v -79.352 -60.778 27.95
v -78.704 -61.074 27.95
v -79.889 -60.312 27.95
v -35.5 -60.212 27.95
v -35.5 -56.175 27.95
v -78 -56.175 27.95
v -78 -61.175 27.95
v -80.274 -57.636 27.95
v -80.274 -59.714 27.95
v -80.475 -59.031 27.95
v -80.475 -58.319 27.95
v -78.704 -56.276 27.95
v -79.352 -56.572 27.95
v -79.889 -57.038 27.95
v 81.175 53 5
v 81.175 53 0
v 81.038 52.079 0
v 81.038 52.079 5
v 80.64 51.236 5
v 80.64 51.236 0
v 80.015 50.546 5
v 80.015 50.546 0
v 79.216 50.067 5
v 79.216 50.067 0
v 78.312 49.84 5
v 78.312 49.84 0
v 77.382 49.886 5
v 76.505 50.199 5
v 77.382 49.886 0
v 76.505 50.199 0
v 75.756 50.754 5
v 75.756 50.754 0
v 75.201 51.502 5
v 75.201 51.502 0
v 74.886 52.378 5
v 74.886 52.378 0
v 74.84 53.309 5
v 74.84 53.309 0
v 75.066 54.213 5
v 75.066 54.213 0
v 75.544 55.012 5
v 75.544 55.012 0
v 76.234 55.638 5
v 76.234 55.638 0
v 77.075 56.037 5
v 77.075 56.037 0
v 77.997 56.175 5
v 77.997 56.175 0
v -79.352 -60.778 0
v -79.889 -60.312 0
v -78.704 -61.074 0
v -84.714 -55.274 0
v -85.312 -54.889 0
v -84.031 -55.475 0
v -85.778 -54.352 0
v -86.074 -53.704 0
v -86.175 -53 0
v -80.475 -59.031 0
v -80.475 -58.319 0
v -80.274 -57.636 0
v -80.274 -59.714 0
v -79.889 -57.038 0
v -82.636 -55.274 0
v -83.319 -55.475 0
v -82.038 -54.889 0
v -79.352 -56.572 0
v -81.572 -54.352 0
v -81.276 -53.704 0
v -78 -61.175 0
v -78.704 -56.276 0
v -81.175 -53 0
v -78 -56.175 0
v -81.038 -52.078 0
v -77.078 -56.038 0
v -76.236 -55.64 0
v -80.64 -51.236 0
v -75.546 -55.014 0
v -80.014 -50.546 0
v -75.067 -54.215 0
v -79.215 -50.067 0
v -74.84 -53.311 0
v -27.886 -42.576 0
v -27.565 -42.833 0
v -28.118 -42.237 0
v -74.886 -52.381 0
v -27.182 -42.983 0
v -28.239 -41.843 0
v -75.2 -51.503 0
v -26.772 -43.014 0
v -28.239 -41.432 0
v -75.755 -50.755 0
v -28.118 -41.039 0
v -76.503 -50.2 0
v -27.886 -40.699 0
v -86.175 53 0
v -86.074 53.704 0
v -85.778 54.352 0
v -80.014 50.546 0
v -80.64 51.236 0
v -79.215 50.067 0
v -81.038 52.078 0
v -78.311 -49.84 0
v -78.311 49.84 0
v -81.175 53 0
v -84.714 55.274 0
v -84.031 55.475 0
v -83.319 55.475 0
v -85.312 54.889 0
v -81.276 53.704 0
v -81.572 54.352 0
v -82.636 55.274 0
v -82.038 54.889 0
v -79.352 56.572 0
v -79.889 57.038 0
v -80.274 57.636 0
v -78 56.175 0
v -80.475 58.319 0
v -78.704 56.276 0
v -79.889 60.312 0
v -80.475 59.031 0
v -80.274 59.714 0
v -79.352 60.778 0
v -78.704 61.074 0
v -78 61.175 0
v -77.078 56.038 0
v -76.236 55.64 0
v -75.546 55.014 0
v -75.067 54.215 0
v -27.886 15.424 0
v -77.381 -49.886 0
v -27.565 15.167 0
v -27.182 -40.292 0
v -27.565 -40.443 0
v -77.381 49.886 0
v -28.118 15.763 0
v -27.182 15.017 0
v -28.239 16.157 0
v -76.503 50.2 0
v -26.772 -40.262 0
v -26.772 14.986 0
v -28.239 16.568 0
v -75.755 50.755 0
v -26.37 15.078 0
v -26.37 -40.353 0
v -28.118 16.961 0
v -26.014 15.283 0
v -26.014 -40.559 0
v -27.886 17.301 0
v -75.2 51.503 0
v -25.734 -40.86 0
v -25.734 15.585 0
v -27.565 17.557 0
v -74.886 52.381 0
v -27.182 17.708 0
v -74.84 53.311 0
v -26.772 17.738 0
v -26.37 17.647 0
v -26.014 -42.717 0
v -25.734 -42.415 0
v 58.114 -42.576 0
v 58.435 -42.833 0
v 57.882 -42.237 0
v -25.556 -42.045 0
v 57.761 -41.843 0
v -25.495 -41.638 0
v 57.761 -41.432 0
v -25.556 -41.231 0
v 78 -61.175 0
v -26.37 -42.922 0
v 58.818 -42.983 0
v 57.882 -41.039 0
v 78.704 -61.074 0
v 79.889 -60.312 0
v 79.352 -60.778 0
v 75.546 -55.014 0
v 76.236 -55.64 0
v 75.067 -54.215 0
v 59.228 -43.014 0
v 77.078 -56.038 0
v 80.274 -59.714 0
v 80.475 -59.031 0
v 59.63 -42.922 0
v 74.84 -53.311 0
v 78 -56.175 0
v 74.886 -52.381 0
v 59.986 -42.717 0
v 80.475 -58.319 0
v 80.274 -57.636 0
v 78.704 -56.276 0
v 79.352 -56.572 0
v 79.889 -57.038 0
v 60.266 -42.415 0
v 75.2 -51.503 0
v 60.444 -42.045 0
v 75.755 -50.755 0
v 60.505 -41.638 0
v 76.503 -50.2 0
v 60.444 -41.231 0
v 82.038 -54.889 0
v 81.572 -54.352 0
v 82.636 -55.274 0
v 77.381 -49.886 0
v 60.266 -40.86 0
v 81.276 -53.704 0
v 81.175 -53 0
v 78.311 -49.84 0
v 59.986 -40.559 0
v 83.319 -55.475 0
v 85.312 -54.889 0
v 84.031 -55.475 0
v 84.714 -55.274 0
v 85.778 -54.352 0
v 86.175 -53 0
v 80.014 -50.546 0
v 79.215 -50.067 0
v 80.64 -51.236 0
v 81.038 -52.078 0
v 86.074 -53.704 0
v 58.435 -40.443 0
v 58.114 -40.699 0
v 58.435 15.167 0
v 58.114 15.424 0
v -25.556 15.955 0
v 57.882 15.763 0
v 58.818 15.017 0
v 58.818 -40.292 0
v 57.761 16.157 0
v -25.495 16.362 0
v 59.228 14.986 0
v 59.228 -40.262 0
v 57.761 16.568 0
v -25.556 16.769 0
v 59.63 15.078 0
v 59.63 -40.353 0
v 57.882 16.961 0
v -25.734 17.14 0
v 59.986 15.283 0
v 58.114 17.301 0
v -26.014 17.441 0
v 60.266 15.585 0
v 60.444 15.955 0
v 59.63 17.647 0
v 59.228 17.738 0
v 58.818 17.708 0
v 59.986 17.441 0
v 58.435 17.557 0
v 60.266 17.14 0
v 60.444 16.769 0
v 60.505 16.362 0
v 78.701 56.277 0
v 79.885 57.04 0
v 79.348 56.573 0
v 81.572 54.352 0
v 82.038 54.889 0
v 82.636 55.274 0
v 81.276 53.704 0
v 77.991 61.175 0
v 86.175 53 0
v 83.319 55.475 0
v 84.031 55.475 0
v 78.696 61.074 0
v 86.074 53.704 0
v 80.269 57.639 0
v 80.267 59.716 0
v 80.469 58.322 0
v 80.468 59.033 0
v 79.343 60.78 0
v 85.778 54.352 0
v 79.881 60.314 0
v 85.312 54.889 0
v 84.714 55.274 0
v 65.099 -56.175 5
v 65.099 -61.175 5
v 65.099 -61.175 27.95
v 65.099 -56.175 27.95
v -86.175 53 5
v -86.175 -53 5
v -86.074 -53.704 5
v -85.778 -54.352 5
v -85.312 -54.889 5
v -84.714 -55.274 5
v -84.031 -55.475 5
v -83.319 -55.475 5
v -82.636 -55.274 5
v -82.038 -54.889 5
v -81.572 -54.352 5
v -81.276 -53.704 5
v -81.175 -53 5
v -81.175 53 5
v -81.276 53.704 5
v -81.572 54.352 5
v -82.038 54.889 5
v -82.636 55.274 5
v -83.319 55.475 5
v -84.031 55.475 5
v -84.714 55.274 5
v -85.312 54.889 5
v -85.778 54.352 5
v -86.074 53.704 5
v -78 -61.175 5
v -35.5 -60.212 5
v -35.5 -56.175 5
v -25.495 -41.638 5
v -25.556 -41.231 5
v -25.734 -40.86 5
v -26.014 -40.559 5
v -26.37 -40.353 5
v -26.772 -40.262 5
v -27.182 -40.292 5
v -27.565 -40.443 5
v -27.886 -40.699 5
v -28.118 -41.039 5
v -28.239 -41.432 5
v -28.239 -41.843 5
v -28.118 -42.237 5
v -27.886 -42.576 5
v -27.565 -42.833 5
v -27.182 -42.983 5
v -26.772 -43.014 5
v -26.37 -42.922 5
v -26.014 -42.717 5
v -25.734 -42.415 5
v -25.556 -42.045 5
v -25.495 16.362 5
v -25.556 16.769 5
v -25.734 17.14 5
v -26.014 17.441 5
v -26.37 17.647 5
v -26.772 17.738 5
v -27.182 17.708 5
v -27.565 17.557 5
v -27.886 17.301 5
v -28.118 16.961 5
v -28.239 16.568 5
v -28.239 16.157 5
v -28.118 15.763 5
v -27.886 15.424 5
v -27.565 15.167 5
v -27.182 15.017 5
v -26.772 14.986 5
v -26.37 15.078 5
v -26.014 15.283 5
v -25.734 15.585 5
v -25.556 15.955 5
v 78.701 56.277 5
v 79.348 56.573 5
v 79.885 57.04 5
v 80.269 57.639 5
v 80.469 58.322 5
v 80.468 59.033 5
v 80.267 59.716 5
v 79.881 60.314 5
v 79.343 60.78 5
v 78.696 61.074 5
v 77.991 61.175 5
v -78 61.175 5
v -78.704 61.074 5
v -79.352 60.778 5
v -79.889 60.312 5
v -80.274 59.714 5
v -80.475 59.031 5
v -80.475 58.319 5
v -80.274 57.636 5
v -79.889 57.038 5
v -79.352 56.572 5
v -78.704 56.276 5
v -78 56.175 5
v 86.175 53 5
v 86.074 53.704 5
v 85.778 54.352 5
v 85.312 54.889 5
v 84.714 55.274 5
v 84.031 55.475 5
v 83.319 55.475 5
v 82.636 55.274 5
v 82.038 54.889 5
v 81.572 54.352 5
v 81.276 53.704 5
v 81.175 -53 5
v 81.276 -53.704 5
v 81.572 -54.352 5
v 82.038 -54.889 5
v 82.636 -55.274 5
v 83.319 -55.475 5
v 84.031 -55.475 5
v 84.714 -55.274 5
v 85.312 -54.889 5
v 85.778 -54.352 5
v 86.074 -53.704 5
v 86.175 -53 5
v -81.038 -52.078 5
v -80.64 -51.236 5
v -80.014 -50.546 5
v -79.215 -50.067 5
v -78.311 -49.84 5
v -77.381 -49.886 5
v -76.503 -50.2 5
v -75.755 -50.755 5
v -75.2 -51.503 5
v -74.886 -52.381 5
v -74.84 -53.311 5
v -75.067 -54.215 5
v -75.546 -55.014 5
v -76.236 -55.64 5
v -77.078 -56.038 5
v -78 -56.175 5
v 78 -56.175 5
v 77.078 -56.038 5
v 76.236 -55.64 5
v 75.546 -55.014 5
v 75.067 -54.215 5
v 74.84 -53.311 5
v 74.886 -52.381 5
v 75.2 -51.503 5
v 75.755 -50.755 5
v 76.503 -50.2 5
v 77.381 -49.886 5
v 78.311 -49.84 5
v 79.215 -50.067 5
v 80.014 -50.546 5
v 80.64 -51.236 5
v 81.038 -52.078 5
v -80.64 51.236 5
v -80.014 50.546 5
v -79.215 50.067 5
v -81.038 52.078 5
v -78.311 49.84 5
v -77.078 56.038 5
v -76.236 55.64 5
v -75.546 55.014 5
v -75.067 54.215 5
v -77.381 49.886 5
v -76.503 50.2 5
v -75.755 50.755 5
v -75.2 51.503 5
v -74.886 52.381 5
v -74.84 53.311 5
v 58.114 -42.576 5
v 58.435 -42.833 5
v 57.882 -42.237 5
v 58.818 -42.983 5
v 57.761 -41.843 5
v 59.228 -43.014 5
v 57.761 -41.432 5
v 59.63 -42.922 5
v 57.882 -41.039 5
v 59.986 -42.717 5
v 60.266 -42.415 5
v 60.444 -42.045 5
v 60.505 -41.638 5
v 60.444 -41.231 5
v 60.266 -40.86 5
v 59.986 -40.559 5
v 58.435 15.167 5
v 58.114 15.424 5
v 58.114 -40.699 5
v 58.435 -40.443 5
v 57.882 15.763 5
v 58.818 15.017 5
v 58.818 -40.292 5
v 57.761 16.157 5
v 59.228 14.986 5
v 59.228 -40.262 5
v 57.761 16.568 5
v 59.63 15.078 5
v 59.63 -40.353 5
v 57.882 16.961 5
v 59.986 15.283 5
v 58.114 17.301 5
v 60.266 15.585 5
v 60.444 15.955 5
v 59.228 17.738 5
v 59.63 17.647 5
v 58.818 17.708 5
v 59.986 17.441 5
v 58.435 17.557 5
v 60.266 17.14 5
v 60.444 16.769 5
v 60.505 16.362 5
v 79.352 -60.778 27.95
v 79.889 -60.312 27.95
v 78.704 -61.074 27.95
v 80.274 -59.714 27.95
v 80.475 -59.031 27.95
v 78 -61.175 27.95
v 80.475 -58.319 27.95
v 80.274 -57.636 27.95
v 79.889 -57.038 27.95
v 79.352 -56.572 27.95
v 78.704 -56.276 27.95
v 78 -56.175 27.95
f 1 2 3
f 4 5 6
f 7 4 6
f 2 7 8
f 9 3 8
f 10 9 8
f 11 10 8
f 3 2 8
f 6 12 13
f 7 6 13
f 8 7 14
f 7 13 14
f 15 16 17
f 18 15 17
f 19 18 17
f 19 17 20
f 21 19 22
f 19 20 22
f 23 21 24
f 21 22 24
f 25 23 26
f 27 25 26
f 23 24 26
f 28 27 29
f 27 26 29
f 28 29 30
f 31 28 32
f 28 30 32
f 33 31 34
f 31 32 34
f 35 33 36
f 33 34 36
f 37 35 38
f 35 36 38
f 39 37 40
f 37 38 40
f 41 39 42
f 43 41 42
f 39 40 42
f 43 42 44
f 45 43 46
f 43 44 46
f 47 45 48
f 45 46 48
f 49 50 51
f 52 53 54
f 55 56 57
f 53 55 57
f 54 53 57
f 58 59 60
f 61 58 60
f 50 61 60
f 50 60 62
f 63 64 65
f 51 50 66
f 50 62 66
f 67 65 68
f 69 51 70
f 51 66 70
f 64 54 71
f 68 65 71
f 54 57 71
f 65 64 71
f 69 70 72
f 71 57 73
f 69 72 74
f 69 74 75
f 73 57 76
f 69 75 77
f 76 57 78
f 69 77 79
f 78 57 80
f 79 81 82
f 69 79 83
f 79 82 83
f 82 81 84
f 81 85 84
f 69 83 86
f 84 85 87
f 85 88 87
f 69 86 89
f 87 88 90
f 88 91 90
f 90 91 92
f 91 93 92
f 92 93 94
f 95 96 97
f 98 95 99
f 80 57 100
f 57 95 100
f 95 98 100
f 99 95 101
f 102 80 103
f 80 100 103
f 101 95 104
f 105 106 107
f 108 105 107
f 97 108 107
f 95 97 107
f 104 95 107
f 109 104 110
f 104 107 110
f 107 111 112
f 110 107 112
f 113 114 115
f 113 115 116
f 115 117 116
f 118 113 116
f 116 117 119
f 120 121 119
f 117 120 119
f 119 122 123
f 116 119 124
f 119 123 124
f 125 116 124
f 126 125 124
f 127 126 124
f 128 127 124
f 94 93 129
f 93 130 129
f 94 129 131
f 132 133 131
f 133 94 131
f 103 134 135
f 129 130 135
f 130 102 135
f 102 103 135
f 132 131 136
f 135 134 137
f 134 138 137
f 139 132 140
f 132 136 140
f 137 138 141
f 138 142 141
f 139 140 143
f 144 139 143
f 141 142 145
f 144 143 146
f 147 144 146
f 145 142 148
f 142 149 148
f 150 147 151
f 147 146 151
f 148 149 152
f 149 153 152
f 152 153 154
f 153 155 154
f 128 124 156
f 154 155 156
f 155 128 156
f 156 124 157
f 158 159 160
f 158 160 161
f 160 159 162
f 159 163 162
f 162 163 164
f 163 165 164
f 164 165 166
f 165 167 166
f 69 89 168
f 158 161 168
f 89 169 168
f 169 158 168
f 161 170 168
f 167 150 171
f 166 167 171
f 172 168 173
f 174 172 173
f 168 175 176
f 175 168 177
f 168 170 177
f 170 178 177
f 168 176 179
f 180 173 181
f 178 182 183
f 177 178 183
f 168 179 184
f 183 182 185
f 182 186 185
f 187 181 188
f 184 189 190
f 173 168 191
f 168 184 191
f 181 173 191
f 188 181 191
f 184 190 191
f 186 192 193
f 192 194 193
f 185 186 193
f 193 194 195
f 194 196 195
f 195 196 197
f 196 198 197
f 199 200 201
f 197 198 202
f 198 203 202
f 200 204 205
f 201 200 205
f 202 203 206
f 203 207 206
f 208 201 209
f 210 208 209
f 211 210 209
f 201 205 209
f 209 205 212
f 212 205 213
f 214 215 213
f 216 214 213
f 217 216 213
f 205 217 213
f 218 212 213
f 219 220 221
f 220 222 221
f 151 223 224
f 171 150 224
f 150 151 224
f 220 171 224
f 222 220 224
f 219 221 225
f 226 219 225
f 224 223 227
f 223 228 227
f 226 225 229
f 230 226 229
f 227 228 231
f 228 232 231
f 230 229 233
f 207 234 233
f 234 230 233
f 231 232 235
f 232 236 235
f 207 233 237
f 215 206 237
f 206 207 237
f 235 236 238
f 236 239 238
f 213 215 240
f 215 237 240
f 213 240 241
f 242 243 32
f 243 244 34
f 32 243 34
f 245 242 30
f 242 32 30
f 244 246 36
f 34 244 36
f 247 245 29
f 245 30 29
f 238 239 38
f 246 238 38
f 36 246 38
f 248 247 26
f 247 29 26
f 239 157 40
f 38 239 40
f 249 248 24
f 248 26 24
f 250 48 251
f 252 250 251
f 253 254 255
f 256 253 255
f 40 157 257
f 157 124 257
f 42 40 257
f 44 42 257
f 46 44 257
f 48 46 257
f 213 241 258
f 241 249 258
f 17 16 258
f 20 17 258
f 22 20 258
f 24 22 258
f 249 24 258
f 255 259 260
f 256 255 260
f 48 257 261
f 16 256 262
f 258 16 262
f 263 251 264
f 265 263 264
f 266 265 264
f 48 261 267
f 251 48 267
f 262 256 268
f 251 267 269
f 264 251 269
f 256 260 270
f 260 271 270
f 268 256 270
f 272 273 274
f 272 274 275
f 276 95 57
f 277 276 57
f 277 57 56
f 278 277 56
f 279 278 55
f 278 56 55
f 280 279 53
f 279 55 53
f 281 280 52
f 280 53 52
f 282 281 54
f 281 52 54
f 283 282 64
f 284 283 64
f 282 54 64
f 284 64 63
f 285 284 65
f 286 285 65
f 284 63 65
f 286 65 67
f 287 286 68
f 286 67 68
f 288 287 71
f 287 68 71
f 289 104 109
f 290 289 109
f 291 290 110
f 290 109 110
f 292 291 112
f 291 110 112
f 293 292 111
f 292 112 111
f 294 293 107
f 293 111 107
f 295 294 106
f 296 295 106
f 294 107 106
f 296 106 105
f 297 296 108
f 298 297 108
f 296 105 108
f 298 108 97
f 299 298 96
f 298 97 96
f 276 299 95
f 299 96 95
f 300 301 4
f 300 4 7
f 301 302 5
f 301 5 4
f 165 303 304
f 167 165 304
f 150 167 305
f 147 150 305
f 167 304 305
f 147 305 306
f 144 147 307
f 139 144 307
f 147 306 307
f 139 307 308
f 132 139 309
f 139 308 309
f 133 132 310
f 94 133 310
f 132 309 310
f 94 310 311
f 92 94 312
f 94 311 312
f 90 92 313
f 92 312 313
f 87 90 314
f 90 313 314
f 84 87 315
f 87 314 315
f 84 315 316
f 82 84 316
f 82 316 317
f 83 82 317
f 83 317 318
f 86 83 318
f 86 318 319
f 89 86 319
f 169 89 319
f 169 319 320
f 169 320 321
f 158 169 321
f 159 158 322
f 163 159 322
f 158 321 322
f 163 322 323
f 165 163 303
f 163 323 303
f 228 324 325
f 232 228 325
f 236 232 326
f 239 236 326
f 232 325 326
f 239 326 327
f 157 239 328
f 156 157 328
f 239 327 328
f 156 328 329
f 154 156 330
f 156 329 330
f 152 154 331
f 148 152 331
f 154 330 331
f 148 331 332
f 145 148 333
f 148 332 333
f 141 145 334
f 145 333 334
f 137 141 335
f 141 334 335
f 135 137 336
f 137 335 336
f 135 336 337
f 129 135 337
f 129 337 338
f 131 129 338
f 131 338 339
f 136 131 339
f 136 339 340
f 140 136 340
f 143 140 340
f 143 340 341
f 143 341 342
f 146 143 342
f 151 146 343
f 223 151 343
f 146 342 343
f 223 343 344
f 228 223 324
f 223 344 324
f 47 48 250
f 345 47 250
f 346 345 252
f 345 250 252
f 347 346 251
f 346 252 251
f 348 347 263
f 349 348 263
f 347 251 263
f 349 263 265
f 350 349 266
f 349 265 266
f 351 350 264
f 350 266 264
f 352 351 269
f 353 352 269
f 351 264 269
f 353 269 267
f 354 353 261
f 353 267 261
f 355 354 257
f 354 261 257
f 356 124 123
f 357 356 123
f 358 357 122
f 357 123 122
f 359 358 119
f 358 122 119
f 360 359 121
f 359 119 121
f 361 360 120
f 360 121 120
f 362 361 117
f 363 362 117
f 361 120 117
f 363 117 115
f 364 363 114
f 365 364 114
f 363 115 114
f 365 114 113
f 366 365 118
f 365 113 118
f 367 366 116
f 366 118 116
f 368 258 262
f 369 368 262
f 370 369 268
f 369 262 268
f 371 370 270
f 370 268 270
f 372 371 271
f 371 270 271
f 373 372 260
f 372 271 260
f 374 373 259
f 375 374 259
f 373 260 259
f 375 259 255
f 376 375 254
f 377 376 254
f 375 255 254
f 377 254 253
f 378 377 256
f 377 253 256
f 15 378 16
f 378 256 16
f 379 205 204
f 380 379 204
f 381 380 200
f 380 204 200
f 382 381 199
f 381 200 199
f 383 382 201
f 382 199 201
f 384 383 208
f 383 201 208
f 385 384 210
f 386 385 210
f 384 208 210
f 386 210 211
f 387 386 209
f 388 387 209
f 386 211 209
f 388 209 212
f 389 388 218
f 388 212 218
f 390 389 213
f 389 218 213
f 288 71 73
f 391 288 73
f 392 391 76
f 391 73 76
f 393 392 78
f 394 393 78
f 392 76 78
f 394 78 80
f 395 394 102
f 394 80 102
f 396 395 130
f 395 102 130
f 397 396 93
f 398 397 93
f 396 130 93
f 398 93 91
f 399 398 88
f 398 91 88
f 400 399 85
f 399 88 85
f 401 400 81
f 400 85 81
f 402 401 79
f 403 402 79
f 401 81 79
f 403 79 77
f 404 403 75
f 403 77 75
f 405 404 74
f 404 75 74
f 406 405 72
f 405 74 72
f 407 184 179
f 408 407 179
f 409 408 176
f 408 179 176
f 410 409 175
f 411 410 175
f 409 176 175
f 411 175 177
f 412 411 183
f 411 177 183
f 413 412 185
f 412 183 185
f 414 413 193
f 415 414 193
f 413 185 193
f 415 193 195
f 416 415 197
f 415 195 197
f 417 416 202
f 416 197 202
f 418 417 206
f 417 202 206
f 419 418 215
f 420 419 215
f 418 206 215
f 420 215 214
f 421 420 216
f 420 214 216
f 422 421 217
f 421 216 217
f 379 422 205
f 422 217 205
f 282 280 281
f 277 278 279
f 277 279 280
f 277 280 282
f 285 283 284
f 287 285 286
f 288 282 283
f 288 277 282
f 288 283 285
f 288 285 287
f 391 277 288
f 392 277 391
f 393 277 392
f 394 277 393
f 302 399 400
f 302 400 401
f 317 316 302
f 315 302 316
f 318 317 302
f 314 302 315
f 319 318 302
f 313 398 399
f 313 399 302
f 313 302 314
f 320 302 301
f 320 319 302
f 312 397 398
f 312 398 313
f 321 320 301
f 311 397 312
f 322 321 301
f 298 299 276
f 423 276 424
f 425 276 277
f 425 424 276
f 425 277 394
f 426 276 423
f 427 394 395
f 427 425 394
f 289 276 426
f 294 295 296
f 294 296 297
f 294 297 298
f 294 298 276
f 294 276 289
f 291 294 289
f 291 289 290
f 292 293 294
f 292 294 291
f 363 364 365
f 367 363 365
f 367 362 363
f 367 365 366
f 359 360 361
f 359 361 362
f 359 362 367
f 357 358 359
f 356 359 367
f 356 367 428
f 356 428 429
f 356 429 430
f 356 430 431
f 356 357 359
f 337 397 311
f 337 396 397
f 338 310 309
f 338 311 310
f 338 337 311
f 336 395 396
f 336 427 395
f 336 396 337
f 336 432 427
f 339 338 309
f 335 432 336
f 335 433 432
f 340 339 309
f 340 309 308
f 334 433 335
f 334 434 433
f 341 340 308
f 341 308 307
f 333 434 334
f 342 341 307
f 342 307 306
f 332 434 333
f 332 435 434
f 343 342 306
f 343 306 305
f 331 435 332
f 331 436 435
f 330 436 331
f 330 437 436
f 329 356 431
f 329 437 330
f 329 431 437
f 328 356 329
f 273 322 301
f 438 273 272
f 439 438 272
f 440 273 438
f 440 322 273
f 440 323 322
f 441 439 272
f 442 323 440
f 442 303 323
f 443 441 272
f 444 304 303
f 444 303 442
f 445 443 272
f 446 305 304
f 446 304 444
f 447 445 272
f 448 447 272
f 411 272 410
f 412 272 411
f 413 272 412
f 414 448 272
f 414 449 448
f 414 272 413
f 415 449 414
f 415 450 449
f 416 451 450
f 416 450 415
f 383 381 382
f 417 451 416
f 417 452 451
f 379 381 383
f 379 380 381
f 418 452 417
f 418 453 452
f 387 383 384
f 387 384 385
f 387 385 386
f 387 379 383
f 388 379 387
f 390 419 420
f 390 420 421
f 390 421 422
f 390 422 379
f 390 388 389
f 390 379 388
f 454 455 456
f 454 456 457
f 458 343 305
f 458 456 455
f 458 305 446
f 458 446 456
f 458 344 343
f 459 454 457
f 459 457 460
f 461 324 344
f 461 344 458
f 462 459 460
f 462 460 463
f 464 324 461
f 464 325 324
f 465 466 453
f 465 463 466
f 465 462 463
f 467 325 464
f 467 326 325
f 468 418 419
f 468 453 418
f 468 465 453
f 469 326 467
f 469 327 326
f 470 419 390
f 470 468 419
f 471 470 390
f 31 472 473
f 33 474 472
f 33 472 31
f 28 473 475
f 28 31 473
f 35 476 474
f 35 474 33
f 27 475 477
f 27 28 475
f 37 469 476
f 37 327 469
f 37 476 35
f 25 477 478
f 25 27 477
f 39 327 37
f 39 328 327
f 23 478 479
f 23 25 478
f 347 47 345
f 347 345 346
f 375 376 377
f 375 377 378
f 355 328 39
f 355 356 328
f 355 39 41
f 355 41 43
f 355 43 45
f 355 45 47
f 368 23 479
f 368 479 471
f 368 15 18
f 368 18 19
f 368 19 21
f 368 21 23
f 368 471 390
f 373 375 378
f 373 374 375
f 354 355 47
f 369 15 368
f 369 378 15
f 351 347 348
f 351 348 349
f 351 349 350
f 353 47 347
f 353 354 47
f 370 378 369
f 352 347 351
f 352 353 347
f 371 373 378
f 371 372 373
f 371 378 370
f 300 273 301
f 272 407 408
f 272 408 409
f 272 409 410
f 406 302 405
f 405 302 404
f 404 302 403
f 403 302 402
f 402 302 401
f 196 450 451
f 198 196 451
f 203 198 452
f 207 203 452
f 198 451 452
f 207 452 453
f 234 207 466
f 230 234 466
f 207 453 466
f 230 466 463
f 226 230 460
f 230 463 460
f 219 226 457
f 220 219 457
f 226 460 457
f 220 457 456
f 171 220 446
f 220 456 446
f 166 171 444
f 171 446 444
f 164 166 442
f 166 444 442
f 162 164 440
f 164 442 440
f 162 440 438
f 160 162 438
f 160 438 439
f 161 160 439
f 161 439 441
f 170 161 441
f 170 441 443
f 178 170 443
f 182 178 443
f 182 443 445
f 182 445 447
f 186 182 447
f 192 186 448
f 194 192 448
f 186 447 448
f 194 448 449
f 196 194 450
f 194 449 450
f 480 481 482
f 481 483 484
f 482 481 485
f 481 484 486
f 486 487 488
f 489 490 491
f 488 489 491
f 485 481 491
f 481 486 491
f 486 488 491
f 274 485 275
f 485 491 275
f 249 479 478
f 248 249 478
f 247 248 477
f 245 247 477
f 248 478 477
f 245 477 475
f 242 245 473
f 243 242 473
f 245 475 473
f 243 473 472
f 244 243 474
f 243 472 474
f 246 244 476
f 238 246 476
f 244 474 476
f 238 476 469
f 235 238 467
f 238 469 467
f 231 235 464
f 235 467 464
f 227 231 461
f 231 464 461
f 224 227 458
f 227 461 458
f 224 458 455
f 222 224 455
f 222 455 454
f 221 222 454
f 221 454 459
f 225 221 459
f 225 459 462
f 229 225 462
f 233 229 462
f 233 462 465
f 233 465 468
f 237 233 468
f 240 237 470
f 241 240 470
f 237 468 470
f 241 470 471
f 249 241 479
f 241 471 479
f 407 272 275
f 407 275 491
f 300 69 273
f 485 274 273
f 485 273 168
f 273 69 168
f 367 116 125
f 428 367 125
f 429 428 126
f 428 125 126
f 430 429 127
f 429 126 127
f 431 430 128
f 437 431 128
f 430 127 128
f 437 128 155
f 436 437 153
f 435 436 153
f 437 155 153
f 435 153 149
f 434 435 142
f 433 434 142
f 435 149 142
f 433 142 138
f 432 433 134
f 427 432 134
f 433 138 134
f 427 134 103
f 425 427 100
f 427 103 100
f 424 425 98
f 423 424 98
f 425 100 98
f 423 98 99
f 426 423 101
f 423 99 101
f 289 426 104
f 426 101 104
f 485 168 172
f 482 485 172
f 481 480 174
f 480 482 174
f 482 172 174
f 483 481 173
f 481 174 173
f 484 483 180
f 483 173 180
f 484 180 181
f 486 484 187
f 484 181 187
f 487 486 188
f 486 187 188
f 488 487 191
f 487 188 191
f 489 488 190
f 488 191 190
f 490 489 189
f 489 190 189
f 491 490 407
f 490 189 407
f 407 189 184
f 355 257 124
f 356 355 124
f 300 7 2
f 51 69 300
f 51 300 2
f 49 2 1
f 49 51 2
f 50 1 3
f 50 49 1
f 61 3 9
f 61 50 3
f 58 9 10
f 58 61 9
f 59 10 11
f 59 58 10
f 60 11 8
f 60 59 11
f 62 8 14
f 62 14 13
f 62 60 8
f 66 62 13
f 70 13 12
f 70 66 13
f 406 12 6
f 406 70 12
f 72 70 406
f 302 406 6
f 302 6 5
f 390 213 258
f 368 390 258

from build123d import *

# Parameters (mm, degrees)
RESSALTO_EXTRUS_O1_DEPTH = 5
RESSALTO_EXTRUS_O2_DEPTH = 22.95
ESBO_O3_R                = 1.38
CORTE_EXTRUS_O1_DEPTH    = 5


with BuildPart() as part:
    # Esboço1 → Ressalto-extrusão1 (new body)
    with BuildSketch(Plane.XY):
        with BuildLine():
            Line((-78, -61.175), (78, -61.175))
            ThreePointArc((78, -61.175), (80.5, -58.675), (78, -56.175))
            ThreePointArc((78, -56.175), (75.75493597, -50.75493597), (81.175, -53))
            ThreePointArc((81.175, -53), (83.675, -55.5), (86.175, -53))
            Line((86.175, -53), (86.175, 53))
            ThreePointArc((86.175, 53), (83.675, 55.5), (81.175, 53))
            ThreePointArc((81.175, 53), (75.756150129, 50.753722467), (77.996566768, 56.174998144))
            ThreePointArc((77.996566768, 56.174998144), (80.493861975, 58.677700014), (77.991160104, 61.174995221))
            Line((77.991160104, 61.174995221), (-78, 61.174995221))
            ThreePointArc((-78, 61.174995221), (-80.5, 58.674995221), (-78, 56.174995221))
            ThreePointArc((-78, 56.174995221), (-75.75493597, 50.75493119), (-81.175, 52.999995221))
            ThreePointArc((-81.175, 52.999995221), (-83.675, 55.499995221), (-86.175, 52.999995221))
            Line((-86.175, 52.999995221), (-86.175, -53))
            ThreePointArc((-86.175, -53), (-83.675, -55.5), (-81.175, -53))
            ThreePointArc((-81.175, -53), (-75.75493597, -50.75493597), (-78, -56.175))
            ThreePointArc((-78, -56.175), (-80.5, -58.675), (-78, -61.175))
        make_face()
    extrude(amount=RESSALTO_EXTRUS_O1_DEPTH)

    # Esboço2 → Ressalto-extrusão2 (add)
    with BuildSketch(Plane.XY.offset(5)):
        with BuildLine():
            Line((-78, -56.175), (-35.5, -56.175))
            Line((-35.5, -56.175), (-35.5, -60.212223694))
            Line((-35.5, -60.212223694), (-78, -61.175))
            ThreePointArc((-78, -61.175), (-80.5, -58.675), (-78, -56.175))
        make_face()
        with BuildLine():
            Line((78, -61.175), (65.099265532, -61.175))
            Line((65.099265532, -61.175), (65.099265532, -56.175))
            Line((65.099265532, -56.175), (78, -56.175))
            ThreePointArc((78, -56.175), (80.5, -58.675), (78, -61.175))
        make_face()
    extrude(amount=RESSALTO_EXTRUS_O2_DEPTH)

    # Esboço3 → Corte-extrusão1 (cut)
    with BuildSketch(Plane.XY.offset(5)):
        with Locations((59.125349465, -41.637776306)):
            Circle(ESBO_O3_R)
        with Locations((59.125349465, 16.362223694)):
            Circle(ESBO_O3_R)
        with Locations((-26.874650535, -41.637776306)):
            Circle(ESBO_O3_R)
        with Locations((-26.874650535, 16.362223694)):
            Circle(ESBO_O3_R)
    extrude(amount=-CORTE_EXTRUS_O1_DEPTH, mode=Mode.SUBTRACT)


solid = part.part
